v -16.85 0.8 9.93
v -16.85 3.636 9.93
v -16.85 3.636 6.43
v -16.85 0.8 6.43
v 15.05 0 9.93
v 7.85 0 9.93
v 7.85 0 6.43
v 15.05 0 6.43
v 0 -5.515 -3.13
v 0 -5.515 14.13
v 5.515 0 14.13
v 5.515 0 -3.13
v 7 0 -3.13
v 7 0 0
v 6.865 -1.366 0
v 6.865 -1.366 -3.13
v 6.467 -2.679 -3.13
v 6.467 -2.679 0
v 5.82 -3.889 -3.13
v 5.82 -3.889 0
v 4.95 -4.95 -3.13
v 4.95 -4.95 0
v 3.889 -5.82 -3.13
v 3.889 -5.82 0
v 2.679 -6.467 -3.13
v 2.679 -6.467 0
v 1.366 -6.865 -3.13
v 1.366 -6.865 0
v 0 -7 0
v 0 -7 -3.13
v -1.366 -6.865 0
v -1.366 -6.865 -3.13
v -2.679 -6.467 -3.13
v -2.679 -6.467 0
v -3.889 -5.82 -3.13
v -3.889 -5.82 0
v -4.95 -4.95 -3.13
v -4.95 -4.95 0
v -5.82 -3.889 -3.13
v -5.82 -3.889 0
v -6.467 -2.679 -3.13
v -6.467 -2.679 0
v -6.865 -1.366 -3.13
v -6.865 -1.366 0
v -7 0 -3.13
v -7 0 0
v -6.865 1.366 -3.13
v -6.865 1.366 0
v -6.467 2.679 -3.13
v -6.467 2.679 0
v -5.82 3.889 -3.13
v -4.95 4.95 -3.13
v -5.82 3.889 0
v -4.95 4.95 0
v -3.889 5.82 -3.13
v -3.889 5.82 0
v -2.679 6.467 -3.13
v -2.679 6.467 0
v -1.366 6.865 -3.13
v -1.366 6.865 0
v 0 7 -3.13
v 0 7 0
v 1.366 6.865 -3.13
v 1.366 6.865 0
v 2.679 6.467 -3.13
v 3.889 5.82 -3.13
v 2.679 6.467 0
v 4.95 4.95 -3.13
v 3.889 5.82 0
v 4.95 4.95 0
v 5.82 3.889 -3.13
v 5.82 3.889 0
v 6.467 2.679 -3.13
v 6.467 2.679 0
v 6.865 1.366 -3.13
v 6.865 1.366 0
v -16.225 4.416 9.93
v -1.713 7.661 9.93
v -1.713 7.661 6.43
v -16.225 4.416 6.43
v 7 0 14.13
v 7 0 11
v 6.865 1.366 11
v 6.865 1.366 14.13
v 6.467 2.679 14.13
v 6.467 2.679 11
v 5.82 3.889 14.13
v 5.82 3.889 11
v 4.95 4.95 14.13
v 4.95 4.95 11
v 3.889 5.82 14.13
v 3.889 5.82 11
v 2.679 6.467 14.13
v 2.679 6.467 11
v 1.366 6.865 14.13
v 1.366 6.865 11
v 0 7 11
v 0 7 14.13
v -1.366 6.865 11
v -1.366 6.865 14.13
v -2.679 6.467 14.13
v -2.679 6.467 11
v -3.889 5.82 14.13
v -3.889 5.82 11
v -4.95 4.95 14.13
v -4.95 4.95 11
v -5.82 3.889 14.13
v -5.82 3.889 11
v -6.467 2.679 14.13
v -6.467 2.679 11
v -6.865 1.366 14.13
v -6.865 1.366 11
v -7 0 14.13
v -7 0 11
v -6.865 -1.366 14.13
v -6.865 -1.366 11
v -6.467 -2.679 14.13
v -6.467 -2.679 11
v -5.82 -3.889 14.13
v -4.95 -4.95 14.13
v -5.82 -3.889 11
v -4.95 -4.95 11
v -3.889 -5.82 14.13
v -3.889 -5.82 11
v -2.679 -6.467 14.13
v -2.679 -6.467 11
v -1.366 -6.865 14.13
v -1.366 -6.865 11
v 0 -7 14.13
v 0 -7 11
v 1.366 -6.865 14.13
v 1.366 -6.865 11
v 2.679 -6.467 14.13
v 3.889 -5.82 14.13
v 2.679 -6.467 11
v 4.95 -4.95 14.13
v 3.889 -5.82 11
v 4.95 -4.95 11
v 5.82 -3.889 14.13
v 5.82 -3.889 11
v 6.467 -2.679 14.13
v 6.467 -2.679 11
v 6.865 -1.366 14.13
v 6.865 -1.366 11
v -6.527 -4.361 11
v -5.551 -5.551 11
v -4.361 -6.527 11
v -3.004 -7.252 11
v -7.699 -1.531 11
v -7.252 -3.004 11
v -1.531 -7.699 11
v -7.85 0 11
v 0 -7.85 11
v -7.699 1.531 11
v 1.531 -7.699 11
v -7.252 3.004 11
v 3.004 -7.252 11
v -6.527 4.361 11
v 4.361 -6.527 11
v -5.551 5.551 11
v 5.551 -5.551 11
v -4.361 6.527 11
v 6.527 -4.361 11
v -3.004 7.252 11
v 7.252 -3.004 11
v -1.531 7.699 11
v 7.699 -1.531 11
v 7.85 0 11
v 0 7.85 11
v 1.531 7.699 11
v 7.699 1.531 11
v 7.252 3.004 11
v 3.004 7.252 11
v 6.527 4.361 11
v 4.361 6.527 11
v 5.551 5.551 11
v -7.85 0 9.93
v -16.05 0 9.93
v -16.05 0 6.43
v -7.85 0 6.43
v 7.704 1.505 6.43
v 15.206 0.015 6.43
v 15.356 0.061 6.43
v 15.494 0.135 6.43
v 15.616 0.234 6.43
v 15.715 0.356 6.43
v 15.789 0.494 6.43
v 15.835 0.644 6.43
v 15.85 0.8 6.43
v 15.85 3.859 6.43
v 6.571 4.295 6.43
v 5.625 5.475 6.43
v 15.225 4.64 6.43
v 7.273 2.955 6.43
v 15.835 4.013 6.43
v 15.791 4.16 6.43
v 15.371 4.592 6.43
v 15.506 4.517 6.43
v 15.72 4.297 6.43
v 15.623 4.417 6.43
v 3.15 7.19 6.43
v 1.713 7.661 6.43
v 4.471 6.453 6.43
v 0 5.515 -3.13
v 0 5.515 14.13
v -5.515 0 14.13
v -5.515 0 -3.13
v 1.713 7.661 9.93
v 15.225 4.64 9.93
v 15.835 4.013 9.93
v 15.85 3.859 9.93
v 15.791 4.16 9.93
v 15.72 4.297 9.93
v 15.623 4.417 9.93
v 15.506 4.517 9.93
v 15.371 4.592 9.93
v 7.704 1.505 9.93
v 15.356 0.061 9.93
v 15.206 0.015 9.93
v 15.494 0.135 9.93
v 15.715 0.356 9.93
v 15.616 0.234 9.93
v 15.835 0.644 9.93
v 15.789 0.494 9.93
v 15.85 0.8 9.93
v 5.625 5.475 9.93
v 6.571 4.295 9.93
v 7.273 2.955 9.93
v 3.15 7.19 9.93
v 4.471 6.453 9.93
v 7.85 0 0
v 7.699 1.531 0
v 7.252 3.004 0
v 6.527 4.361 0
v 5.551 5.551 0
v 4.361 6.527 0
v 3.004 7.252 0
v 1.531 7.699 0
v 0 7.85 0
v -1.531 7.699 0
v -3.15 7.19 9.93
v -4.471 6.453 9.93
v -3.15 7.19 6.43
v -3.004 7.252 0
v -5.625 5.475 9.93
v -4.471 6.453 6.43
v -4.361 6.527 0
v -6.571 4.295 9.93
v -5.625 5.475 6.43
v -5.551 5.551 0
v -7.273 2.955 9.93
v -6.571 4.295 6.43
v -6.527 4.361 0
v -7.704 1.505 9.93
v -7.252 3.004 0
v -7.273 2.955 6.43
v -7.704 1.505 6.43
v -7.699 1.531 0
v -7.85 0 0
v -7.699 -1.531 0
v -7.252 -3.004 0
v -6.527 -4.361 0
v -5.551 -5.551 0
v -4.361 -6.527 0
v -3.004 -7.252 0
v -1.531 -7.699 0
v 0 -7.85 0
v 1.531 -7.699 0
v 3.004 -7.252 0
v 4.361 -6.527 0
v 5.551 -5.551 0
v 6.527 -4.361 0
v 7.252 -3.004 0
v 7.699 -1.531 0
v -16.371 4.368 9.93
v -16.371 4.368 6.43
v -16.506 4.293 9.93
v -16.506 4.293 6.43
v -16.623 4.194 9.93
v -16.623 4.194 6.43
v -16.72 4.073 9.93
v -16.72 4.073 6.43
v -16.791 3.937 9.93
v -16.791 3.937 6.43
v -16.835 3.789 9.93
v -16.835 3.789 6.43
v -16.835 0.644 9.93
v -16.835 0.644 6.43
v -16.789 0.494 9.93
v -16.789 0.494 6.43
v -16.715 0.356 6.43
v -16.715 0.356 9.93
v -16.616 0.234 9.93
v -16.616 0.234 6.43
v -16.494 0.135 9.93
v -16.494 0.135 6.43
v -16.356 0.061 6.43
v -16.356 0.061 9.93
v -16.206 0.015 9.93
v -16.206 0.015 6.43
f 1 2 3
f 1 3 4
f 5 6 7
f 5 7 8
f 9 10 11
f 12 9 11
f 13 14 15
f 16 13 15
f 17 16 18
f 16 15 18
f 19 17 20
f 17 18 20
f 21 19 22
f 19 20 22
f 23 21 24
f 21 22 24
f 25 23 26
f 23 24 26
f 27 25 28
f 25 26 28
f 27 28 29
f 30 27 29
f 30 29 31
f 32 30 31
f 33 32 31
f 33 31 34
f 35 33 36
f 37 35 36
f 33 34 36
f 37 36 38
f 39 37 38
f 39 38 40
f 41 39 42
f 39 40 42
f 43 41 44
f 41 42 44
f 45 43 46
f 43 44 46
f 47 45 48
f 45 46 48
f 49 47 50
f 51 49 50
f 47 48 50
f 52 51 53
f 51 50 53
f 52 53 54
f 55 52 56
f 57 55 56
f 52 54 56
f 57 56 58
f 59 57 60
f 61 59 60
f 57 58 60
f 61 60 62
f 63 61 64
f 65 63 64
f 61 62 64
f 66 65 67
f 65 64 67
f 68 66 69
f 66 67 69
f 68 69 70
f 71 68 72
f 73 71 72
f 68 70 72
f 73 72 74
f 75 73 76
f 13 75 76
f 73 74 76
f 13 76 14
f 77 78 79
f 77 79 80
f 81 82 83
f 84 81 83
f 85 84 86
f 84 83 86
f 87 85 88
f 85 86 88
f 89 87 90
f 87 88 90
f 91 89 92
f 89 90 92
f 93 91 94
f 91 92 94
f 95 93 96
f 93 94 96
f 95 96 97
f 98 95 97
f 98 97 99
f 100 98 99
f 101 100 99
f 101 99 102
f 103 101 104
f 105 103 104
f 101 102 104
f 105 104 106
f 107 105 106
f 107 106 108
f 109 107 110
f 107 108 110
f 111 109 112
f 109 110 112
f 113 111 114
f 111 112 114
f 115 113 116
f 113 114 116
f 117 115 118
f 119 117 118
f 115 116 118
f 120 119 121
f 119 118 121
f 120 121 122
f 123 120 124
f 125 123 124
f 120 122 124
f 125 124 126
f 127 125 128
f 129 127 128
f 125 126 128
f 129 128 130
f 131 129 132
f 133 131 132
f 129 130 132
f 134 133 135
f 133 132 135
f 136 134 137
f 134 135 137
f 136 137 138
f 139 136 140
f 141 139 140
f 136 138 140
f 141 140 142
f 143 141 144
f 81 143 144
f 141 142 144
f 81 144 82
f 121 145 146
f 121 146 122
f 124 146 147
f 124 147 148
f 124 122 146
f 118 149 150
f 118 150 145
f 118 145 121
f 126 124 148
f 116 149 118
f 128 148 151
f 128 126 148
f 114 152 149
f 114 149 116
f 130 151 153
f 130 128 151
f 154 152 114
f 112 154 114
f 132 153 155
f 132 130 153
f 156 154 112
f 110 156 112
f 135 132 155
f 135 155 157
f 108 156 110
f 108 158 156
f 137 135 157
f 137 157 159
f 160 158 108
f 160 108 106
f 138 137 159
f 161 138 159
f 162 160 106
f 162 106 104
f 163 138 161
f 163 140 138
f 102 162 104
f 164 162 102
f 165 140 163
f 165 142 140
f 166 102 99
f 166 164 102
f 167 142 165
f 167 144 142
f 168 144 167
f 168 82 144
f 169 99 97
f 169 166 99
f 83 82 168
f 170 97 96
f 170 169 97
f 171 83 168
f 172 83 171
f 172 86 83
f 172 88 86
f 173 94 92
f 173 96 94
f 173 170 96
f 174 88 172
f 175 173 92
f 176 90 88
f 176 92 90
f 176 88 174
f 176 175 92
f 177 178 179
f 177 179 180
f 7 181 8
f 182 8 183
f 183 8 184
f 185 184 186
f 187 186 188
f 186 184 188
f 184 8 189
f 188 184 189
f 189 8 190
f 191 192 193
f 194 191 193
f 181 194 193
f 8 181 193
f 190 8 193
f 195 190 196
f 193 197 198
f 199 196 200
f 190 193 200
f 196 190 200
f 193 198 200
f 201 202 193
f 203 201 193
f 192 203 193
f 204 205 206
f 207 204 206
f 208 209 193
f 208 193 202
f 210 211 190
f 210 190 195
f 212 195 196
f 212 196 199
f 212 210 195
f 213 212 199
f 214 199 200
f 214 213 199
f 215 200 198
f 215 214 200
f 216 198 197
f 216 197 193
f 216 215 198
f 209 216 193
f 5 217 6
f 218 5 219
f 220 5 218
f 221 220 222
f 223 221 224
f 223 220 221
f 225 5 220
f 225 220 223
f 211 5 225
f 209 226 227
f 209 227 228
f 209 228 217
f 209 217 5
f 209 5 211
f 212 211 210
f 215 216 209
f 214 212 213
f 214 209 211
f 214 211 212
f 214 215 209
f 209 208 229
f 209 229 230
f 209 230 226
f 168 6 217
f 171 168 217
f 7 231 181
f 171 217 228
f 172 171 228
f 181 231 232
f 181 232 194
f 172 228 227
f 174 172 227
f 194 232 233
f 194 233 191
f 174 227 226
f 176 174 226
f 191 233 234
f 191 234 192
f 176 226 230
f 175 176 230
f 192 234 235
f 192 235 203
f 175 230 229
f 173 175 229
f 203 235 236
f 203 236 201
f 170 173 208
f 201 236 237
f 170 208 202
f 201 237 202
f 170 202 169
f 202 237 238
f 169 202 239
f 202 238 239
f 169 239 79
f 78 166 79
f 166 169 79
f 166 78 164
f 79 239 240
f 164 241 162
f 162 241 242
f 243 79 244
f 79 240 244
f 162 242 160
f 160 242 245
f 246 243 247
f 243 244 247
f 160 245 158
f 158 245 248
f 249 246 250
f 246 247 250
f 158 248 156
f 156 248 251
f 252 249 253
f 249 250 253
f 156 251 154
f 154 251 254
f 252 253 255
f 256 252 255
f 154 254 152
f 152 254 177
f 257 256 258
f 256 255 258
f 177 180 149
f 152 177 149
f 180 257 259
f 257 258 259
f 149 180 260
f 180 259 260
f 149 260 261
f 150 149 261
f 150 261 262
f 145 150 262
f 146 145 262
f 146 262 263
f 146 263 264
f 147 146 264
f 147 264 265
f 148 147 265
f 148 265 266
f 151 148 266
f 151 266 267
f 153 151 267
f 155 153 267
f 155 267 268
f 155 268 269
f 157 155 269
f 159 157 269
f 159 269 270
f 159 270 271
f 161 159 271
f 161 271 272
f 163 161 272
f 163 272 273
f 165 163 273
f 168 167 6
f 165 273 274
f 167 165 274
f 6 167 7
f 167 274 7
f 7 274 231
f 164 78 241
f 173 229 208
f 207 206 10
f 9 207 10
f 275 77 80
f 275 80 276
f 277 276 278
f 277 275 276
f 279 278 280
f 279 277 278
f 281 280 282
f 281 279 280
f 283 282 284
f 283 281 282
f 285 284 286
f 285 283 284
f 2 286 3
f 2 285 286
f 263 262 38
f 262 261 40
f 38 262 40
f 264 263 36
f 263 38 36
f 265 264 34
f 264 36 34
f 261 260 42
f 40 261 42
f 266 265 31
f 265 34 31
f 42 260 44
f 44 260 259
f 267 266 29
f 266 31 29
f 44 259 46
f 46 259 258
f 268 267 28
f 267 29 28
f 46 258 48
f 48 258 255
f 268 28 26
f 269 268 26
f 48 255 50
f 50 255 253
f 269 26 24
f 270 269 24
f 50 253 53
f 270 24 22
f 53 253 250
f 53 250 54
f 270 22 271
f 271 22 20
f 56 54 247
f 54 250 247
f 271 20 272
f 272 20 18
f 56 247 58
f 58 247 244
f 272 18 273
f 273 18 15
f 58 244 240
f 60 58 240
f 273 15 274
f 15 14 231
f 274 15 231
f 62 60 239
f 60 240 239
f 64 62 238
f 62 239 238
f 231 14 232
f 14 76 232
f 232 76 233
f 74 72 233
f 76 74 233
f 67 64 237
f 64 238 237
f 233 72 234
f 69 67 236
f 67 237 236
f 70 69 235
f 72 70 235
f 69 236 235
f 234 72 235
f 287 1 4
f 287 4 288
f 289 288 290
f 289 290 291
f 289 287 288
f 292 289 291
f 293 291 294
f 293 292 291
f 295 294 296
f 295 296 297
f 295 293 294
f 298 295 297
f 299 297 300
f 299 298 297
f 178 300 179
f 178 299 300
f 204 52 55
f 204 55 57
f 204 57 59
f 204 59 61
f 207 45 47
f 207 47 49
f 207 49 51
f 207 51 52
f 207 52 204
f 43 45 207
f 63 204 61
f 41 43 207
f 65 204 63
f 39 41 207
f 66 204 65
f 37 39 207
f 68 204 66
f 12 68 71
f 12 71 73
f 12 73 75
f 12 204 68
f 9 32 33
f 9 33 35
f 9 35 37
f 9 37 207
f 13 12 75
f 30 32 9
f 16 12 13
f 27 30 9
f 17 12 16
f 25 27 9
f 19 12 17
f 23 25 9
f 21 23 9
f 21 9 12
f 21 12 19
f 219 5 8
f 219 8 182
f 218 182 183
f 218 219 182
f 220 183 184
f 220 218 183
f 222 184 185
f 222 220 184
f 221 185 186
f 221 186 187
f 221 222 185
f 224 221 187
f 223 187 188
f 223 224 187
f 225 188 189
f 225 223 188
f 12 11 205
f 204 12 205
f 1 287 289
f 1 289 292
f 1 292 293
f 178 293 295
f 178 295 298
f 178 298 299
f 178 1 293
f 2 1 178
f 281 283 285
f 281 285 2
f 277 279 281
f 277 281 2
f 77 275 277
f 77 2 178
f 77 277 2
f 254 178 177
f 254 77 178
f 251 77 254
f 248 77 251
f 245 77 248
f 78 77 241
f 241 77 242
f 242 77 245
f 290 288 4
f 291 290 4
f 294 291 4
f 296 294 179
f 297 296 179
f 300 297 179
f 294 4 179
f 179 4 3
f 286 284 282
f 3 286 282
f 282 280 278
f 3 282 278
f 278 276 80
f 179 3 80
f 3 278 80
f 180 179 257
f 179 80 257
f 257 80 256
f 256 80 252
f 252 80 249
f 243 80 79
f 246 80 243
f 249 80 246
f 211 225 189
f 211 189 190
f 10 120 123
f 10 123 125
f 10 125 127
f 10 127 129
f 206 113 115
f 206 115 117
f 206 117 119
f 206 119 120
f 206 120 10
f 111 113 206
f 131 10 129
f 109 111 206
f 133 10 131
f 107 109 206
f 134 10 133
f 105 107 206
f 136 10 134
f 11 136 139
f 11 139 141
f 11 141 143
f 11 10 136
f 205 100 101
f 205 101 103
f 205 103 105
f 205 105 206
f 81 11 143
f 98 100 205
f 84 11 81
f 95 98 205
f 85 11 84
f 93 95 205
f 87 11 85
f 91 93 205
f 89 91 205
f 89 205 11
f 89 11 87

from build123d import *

# Parameters (mm, degrees)
F0_R      = 7.85
F1_DEPTH  = 11
F2_R      = 7
F3_DEPTH  = 3.13
F4_R      = 7
F5_DEPTH  = 3.13
F7_DEPTH  = 17.261
F10_DEPTH = 3.5


with BuildPart() as f1:
    # F0 (on Top) → F1 (new body)
    with BuildSketch(Plane.XY):
        Circle(F0_R)
    extrude(amount=F1_DEPTH)

    # F2 (on face) → F3 (join)
    with BuildSketch(Plane.XY.offset(11)):
        Circle(F2_R)
    extrude(amount=F3_DEPTH)

    # F4 (on face) → F5 (join)
    with BuildSketch(Plane(origin=(0, 0, 0), x_dir=(1, 0, 0), z_dir=(0, 0, -1))):
        Circle(F4_R)
    extrude(amount=F5_DEPTH)

    # F6 (on face) → F7 (cut, through all)
    with BuildSketch(Plane.XY.offset(14.13)):
        Polygon((5.5154328933, 0), (0, 5.5154328933), (0, 0), align=None)
        Polygon((0, 0), (0, 5.5154328933), (-5.5154328933, 0), align=None)
        Polygon((5.5154328933, 0), (0, 0), (0, -5.5154328933), align=None)
        Polygon((0, -5.5154328933), (0, 0), (-5.5154328933, 0), align=None)
    extrude(amount=-F7_DEPTH, mode=Mode.SUBTRACT)

    # F9 (on offset) → F10 (join)
    with BuildSketch(Plane.XY.offset(9.93)):
        with BuildLine():
            Line((-16.05, 0), (-7.85, 0))
            ThreePointArc((-7.85, 0), (-6.1265149302, 4.9079848013), (-1.7128497301, 7.6608515063))
            Line((-1.7128497301, 7.6608515063), (-16.2245579343, 4.41625455))
            ThreePointArc((-16.2245579343, 4.41625455), (-16.6743582095, 4.1357076247), (-16.85, 3.6355308296))
            Line((-16.85, 3.6355308296), (-16.85, 0.8))
            ThreePointArc((-16.85, 0.8), (-16.6156854249, 0.2343145751), (-16.05, 0))
        make_face()
        with BuildLine():
            ThreePointArc((1.7128497301, 7.6608515063), (6.1265149302, 4.9079848013), (7.85, 0))
            Line((7.85, 0), (15.05, 0))
            ThreePointArc((15.05, 0), (15.6156854249, 0.2343145751), (15.85, 0.8))
            Line((15.85, 0.8), (15.85, 3.8591156007))
            ThreePointArc((15.85, 3.8591156007), (15.6743582095, 4.3592923957), (15.2245579343, 4.6398393211))
            Line((15.2245579343, 4.6398393211), (1.7128497301, 7.6608515063))
        make_face()
    extrude(amount=-F10_DEPTH)


solid = f1.part
